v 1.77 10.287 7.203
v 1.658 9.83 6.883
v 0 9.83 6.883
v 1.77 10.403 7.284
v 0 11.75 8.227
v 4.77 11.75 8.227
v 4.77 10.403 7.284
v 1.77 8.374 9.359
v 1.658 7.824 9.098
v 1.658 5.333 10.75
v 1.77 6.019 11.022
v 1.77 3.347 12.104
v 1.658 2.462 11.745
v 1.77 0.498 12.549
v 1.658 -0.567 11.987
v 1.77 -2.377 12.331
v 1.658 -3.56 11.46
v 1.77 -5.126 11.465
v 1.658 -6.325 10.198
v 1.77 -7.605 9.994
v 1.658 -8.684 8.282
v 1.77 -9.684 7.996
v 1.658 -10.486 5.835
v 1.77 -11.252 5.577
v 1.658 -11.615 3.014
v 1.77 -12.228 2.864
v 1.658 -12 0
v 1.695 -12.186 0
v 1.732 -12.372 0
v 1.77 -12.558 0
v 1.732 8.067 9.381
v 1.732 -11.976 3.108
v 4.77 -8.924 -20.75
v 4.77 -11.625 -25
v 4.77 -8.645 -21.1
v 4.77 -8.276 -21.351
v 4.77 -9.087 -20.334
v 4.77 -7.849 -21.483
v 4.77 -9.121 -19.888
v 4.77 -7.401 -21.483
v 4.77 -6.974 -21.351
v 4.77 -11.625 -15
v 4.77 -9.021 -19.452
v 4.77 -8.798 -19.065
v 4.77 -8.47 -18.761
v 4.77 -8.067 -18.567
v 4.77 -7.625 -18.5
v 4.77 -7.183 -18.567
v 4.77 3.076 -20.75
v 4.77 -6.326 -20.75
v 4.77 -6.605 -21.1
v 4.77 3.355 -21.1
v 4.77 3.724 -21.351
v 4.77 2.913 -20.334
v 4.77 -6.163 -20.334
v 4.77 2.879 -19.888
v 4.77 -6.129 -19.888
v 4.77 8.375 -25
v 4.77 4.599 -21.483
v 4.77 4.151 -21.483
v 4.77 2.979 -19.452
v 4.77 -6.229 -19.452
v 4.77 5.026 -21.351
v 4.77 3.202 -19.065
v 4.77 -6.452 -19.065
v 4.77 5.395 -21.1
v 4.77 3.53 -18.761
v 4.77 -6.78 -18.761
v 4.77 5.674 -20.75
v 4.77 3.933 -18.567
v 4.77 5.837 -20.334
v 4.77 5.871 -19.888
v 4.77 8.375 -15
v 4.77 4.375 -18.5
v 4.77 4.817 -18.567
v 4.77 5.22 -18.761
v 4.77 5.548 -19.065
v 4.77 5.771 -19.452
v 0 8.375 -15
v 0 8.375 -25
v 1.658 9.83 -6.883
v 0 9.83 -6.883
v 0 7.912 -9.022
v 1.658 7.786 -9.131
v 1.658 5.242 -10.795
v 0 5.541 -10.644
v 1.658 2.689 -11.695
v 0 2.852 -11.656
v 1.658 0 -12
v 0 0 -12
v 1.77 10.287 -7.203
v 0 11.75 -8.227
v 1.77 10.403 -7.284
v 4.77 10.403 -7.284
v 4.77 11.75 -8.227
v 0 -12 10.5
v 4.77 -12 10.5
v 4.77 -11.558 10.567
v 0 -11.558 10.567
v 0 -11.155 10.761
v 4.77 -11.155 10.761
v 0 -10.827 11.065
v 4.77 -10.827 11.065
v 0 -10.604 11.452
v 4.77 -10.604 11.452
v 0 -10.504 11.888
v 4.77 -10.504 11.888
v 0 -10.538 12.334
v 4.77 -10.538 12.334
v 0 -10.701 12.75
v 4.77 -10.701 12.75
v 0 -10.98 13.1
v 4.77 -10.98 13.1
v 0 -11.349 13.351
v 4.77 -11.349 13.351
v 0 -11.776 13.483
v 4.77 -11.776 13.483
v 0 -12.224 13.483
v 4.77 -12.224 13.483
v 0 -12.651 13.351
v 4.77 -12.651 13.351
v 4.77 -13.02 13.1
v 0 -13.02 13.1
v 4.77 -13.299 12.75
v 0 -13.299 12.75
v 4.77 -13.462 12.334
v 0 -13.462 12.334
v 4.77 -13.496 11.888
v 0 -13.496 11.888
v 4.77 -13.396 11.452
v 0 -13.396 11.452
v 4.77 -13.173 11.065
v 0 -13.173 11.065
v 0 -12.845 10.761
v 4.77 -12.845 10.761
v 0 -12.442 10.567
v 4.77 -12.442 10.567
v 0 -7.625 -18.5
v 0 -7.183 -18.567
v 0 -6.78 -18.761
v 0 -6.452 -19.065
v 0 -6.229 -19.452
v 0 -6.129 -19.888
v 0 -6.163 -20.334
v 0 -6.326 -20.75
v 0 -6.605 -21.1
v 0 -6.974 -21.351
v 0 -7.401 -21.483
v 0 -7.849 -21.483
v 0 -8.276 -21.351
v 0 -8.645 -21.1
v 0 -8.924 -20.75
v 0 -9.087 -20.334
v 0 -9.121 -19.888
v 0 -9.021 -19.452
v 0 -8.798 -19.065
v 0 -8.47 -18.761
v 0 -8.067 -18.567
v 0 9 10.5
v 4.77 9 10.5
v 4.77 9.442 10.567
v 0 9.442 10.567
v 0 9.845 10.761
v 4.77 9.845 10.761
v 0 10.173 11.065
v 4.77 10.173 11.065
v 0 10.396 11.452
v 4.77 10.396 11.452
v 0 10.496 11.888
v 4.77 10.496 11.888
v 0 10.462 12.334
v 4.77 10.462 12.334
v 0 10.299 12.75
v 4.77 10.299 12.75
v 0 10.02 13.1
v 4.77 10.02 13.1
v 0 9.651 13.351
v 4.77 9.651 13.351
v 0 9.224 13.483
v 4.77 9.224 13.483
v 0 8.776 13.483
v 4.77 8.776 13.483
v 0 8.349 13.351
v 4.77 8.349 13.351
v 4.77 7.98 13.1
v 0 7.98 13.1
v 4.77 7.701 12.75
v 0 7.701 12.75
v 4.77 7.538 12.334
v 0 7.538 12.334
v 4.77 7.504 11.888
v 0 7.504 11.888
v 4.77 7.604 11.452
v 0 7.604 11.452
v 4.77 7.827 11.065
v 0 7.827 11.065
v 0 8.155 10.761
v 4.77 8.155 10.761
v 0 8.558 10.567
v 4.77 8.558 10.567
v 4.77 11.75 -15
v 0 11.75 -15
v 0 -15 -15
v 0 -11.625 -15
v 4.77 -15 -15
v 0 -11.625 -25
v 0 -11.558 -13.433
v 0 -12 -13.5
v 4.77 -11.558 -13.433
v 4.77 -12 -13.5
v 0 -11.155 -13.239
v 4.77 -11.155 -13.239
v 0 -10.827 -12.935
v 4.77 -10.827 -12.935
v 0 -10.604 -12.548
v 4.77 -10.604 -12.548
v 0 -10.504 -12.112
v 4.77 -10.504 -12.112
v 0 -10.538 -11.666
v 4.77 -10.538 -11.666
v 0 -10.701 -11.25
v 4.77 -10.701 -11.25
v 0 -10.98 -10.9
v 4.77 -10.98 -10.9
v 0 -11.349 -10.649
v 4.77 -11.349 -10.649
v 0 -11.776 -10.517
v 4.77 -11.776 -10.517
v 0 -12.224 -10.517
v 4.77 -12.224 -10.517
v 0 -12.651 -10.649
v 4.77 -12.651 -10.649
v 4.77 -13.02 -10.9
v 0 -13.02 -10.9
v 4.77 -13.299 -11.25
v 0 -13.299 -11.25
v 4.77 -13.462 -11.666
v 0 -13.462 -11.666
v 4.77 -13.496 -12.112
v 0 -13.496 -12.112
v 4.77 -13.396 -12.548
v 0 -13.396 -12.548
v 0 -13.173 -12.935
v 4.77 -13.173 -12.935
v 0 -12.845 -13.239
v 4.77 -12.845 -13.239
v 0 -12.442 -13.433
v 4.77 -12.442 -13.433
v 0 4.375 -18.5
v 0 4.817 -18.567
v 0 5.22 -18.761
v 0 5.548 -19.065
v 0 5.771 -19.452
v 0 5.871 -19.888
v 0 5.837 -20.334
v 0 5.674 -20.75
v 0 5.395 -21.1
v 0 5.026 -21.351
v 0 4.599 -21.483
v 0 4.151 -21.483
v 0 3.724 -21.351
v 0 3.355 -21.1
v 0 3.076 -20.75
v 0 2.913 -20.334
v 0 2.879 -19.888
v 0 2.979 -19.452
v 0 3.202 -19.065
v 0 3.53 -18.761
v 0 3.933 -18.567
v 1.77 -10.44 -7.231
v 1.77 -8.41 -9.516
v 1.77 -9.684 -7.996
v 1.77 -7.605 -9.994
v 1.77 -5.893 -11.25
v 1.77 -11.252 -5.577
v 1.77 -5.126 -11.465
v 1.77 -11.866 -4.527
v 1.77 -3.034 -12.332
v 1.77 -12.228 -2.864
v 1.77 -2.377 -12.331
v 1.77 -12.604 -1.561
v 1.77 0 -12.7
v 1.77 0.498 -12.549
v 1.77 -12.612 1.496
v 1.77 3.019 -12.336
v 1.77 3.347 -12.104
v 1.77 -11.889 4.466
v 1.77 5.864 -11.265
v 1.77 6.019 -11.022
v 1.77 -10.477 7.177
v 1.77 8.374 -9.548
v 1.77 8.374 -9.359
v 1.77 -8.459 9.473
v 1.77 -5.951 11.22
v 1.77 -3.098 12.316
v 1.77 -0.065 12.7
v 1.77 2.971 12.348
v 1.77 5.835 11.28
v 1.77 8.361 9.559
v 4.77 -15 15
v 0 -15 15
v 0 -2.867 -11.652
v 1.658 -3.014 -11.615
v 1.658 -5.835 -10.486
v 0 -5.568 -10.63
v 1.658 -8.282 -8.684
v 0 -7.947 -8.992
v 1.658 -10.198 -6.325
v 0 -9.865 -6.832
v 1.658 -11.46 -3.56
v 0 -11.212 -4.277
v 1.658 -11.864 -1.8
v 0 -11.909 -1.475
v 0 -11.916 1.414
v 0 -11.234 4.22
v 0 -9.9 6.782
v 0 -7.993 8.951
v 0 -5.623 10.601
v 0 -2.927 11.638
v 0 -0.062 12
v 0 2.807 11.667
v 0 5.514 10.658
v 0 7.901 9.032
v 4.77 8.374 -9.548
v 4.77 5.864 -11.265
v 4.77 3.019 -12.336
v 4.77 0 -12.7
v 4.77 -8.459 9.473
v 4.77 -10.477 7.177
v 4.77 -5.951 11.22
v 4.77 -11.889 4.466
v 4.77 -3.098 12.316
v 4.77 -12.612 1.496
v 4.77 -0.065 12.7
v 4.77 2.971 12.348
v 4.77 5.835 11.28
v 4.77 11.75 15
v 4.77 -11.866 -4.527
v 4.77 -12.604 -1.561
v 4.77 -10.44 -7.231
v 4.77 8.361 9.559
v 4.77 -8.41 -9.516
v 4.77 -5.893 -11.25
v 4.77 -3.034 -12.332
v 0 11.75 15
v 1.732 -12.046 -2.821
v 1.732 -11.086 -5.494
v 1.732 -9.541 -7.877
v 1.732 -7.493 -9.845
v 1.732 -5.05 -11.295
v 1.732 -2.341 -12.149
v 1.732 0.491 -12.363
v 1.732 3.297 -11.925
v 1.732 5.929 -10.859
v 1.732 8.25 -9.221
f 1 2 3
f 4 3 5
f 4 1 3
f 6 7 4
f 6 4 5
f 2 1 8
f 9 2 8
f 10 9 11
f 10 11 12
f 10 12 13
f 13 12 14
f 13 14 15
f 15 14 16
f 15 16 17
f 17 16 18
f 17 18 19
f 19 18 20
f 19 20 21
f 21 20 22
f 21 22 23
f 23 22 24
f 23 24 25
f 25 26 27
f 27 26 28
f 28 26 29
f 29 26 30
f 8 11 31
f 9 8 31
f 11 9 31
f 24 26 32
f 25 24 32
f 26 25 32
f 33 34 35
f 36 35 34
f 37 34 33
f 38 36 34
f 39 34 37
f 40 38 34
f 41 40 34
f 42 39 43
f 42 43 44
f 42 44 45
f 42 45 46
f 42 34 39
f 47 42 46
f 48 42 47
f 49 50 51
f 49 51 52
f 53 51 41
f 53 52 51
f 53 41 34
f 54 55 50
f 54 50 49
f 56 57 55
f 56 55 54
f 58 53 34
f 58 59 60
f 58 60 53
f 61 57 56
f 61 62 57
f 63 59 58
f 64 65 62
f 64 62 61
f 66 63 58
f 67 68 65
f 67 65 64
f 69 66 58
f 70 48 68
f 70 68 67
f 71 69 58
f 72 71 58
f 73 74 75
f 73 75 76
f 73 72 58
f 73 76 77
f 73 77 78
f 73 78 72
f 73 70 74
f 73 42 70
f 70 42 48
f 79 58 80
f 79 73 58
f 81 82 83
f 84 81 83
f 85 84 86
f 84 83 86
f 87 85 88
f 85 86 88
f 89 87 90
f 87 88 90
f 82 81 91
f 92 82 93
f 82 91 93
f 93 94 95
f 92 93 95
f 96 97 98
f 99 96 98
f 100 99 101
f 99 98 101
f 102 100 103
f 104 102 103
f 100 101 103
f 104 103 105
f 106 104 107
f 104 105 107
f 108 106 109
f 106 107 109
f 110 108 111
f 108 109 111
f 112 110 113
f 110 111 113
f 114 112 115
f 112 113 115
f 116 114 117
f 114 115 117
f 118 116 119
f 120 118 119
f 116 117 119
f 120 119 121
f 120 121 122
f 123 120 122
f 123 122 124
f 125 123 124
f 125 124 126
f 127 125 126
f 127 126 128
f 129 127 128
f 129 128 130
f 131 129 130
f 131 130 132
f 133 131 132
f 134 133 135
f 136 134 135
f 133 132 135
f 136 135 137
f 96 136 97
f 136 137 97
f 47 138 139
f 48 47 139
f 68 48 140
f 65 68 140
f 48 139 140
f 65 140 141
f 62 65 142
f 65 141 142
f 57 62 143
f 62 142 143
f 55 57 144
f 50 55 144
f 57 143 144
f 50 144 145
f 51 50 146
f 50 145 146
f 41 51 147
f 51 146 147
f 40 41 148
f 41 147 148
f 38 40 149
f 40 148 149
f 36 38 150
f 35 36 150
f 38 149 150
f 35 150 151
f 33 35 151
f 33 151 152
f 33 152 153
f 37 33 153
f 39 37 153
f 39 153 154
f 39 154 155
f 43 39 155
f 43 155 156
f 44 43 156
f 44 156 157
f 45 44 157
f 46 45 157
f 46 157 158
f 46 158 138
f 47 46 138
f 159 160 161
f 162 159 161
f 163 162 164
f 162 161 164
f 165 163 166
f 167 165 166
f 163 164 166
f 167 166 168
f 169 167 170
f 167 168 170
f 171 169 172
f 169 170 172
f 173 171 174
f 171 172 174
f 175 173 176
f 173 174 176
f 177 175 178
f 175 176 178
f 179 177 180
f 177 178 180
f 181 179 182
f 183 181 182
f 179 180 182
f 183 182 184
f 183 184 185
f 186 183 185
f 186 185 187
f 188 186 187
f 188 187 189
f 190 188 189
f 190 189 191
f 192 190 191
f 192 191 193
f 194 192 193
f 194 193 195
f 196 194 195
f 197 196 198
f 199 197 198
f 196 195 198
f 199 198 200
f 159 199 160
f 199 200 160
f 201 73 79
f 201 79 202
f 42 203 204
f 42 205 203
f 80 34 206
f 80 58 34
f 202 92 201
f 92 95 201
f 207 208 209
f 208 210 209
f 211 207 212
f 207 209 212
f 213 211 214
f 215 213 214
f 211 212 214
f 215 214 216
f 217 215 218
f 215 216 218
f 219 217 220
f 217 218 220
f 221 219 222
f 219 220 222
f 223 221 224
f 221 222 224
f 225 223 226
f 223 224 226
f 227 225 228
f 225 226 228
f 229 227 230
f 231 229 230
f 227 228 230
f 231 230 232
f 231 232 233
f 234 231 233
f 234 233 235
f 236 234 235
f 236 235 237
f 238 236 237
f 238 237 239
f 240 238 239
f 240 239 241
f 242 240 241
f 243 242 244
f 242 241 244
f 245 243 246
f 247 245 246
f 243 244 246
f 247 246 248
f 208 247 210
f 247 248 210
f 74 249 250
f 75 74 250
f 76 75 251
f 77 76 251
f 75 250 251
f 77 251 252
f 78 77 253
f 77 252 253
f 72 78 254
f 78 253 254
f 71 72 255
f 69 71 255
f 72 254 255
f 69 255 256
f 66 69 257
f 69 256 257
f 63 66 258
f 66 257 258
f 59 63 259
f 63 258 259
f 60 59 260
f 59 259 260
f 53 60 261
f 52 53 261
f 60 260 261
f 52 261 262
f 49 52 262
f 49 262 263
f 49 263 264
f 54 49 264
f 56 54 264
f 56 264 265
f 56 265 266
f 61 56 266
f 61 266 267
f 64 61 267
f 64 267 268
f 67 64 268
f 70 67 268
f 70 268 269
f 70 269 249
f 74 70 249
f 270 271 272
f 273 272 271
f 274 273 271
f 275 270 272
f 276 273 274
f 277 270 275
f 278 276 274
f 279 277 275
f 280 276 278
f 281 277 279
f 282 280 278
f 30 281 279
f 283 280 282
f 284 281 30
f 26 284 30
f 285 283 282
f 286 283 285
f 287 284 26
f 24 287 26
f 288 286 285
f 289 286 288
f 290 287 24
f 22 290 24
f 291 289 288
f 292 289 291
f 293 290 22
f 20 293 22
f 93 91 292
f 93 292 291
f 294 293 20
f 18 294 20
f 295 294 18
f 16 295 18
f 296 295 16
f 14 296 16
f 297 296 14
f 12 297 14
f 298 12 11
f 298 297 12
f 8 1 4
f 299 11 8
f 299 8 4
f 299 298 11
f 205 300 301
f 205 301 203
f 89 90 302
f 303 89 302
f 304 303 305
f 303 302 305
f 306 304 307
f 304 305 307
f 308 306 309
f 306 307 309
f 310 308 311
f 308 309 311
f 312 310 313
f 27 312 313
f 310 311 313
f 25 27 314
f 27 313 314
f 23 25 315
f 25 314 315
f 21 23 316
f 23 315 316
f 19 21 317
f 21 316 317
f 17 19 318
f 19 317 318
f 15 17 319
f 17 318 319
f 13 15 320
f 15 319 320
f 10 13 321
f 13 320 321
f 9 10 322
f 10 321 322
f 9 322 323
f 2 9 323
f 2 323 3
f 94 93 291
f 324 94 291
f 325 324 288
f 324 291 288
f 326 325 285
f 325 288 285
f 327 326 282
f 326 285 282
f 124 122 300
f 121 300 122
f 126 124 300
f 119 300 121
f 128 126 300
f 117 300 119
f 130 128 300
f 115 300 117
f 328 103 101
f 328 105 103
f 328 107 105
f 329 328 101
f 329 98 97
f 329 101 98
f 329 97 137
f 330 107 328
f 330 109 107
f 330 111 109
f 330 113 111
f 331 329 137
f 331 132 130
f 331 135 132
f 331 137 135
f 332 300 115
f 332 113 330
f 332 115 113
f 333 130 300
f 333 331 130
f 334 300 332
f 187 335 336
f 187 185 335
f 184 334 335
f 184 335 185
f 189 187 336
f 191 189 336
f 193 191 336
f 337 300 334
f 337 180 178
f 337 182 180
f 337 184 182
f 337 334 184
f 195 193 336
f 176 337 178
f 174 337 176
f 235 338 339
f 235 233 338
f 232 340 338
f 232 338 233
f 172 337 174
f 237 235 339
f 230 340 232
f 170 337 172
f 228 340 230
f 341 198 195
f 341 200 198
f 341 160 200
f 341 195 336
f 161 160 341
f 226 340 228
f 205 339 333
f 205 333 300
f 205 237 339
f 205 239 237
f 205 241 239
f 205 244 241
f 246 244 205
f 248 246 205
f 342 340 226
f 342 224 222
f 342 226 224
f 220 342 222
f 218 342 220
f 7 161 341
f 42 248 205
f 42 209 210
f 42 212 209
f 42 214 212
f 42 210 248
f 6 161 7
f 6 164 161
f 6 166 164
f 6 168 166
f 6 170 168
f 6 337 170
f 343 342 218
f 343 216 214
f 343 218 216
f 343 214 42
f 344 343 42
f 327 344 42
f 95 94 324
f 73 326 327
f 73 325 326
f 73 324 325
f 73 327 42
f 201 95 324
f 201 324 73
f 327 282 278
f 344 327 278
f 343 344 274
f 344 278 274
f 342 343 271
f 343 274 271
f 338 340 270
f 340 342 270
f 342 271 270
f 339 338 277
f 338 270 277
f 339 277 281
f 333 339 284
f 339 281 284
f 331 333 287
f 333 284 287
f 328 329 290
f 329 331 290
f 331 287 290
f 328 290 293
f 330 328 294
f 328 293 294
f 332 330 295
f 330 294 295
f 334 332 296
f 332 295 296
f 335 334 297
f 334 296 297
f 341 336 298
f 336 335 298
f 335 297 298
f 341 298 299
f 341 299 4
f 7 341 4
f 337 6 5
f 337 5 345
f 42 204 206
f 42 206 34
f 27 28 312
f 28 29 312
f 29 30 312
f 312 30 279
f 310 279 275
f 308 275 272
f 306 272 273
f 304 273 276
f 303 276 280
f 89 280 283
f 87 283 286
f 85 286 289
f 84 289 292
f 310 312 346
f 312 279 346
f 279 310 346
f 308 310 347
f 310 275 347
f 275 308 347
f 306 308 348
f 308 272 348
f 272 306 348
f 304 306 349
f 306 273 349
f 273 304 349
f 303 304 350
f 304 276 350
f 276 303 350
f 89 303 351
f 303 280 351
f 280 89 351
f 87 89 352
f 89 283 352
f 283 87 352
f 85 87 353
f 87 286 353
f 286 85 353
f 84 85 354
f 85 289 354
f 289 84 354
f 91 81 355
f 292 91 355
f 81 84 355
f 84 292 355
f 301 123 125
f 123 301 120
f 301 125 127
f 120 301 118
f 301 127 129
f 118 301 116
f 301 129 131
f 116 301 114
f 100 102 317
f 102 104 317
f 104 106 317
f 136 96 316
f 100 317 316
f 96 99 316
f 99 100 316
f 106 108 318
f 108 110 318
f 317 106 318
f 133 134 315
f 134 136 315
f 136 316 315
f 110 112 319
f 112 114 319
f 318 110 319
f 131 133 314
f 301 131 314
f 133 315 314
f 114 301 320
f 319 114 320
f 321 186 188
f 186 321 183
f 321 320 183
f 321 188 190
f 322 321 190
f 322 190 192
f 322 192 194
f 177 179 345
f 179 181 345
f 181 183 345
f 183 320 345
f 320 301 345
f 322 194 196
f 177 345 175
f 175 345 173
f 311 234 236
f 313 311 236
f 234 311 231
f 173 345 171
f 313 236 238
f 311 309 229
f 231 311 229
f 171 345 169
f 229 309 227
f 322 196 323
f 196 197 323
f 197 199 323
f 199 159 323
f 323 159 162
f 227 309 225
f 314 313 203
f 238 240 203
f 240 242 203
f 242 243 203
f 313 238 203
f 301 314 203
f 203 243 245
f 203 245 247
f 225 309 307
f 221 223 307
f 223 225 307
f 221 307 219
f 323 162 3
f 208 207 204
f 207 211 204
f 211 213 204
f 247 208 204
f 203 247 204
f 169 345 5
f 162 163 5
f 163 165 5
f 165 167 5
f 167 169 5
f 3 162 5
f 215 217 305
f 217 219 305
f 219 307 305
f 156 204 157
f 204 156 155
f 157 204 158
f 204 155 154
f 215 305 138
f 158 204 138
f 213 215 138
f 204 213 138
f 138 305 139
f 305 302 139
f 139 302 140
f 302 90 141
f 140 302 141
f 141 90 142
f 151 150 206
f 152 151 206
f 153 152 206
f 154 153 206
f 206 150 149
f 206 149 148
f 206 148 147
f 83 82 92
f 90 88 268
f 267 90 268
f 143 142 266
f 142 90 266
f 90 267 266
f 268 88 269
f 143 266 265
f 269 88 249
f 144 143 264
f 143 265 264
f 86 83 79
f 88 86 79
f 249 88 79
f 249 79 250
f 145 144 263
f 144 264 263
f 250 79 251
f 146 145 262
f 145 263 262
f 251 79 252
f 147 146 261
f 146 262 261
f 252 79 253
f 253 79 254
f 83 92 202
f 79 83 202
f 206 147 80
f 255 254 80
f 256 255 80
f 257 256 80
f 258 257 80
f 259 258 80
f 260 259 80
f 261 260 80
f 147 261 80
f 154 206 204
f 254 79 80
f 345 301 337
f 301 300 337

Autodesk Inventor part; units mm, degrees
ref_plane "YZ Plane" through (0, 0, 0) normal (1, 0, 0) x (0, 1, 0)
ref_plane "XZ Plane" through (0, 0, 0) normal (0, 1, 0) x (-1, 0, 0)
sketch "Sketch1" plane through (0, 0, 0) normal (1, 0, 0) x (0, 1, 0)
  line L0 (-15, 15) -> (15, 15)
  line L1 (15, 15) -> (15, -15)
  line L2 (15, -15) -> (-15, -15)
  line L3 (-15, -15) -> (-15, 15)
  line L4 (-15, 15) -> (15, -15) construction
  line L5 (15, 15) -> (-15, -15) construction
  point P0 (0, 0)
  dimension "d0" = 30
  dimension "d1" = 30
extrude "Extrusion1" add sketch "Sketch1" along normal blind 1.7695
sketch "Sketch2" plane through (1.7695, 0, 0) normal (1, 0, 0) x (0, 0, -1)
  circle A0 centre (0, 0) radius 12
  dimension "d4" = 24
extrude "Extrusion2" cut sketch "Sketch2" against normal up to next
sketch "Sketch3" plane through (0, 0, 0) normal (0, 0, 1) x (1, 0, 0)
  line L0 (1.7695, 15) -> (1.7695, -15) projected
  line L1 (1.7695, 0) -> (1.7695, -12.5584)
  line L2 (0.5, 0) -> (1.7695, 0)
  arc A0 (0.5, 0) -> (1.7695, -12.5584) centre (63.25, 0) ccw
  point P0 (0, 0)
  dimension "d7" = 12.5584
  dimension "d8" = 125.5
revolve "Revolution1" cut sketch "Sketch3" angle 360 about axis through (0.5, 0, 0) along (1, 0, 0)
sketch "Sketch4" plane through (1.7695, 0, 0) normal (1, 0, 0) x (0, 0, -1)
  circle A0 centre (0, 0) radius 12.7
  line L0 (-15, 15) -> (-15, -15) projected
  line L1 (-15, 15) -> (15, 15)
  line L2 (15, 15) -> (15, -15)
  line L3 (15, -15) -> (-15, -15)
  line L4 (-15, -15) -> (-15, 15)
  dimension "d10" = 25.4
extrude "Extrusion3" add sketch "Sketch4" along normal blind 3
ref_plane "Work Plane1" through (0, 0, 0) normal (-1, 0, 0) x (0, 0, 1)
mirror "Mirror1" about plane through (0, 0, 0) normal (-1, 0, 0) of "Extrusion1", "Extrusion2", "Revolution1", "Extrusion3"
sketch "Sketch8" plane through (4.7695, 0, 0) normal (1, 0, 0) x (0, 0, -1)
  circle A0 centre (12, -12) radius 1.5
  line L0 (-15, -15) -> (15, -15) projected
  line L1 (15, -15) -> (15, 15) projected
  circle A1 centre (-12, -12) radius 1.5
  circle A2 centre (-12, 9) radius 1.5
  line L2 (-15, 15) -> (-15, -15) projected
  line L3 (15, 15) -> (-15, 15) projected
  point P0 (0, 0)
  dimension "d30" = 3
  dimension "d31" = 3
  dimension "d32" = 3
  dimension "d33" = 3
  dimension "d34" = 3
  dimension "d35" = 3
  dimension "d36" = 6
extrude "Extrusion7" cut sketch "Sketch8" against normal up to surface (9.5391 mm away) contours A0 | A1 | A2
sketch "Sketch9" plane through (4.7695, 0, 0) normal (1, 0, 0) x (0, 0, -1)
  line L0 (0, 0) -> (-8.2274, 11.75)
  line L1 (-8.2274, 11.75) -> (-15, 11.75)
  line L2 (-15, 15) -> (-15, -15) projected
  line L3 (0, 0) -> (0, 15) construction
  line L4 (-15, 11.75) -> (-15, 15)
  line L5 (15, 15) -> (-15, 15) projected
  line L6 (0, 15) -> (-15, 15)
  line L7 (0, 0) -> (8.2274, 11.75)
  line L8 (8.2274, 11.75) -> (15, 11.75)
  line L9 (15, 15) -> (15, -15)
  line L10 (-15, 15) -> (15, 15)
  dimension "d39" = 35
  dimension "d42" = 3.25
extrude "Extrusion8" cut sketch "Sketch9" against normal up to surface (9.5391 mm away)
sketch "Sketch11" plane through (4.7695, -15, -15) normal (0, 0, -1) x (-1, 0, 0)
  line L0 (9.5391, 0) -> (9.5391, 26.75) projected
  line L1 (0, 0) -> (9.5391, 26.75) construction
  line L2 (0, 26.75) -> (9.5391, 26.75) projected
  line L3 (0, 26.75) -> (9.5391, 0) construction
  line L4 (0, 0) -> (0, 26.75) projected
  line L5 (9.5391, 3.375) -> (0, 3.375)
  line L6 (0, 3.375) -> (0, 23.375)
  line L7 (0, 23.375) -> (9.5391, 23.375)
  line L8 (9.5391, 23.375) -> (9.5391, 3.375)
  line L9 (9.5391, 3.375) -> (0, 23.375) construction
  line L10 (0, 3.375) -> (9.5391, 23.375) construction
  point P0 (4.7695, 15)
  point P1 (4.7695, 13.375)
  dimension "d46" = 20
extrude "Extrusion10" add sketch "Sketch11" along normal blind 10 contours L5 L4 L7 L0
sketch "Sketch12" plane through (-4.7695, -15, -15) normal (-1, 0, 0) x (0, 0, 1)
  circle A0 centre (-5, 19.375) radius 1.5
  circle A1 centre (-5, 7.375) radius 1.5
  line L0 (0, 3.375) -> (-10, 3.375) projected
  line L1 (0, 23.375) -> (-10, 23.375) projected
  point P0 (15, 15)
  dimension "d49" = 4
  dimension "d50" = 5
  dimension "d51" = 4
  dimension "d52" = 5
  dimension "d53" = 3
extrude "Extrusion11" cut sketch "Sketch12" against normal up to surface (9.5391 mm away)
sketch "Sketch13" plane through (4.7695, -15, -15) normal (0, -1, 0) x (1, 0, 0)
  line L0 (-9.5391, 30) -> (0, 30) projected
  line L1 (-4.7695, 30) -> (-4.7695, -10)
  line L2 (0, -10) -> (-9.5391, -10) projected
  point P0 (-4.7695, 15)
split body "Split2" sketch "Sketch13" result one side removed curves L1 removed pieces at (-0.5, -13.971, -0.4809)
equation "\"d37\" = d32"
properties part number "LargeLensHolderP1S1" material "Acetal Resin, Black"
